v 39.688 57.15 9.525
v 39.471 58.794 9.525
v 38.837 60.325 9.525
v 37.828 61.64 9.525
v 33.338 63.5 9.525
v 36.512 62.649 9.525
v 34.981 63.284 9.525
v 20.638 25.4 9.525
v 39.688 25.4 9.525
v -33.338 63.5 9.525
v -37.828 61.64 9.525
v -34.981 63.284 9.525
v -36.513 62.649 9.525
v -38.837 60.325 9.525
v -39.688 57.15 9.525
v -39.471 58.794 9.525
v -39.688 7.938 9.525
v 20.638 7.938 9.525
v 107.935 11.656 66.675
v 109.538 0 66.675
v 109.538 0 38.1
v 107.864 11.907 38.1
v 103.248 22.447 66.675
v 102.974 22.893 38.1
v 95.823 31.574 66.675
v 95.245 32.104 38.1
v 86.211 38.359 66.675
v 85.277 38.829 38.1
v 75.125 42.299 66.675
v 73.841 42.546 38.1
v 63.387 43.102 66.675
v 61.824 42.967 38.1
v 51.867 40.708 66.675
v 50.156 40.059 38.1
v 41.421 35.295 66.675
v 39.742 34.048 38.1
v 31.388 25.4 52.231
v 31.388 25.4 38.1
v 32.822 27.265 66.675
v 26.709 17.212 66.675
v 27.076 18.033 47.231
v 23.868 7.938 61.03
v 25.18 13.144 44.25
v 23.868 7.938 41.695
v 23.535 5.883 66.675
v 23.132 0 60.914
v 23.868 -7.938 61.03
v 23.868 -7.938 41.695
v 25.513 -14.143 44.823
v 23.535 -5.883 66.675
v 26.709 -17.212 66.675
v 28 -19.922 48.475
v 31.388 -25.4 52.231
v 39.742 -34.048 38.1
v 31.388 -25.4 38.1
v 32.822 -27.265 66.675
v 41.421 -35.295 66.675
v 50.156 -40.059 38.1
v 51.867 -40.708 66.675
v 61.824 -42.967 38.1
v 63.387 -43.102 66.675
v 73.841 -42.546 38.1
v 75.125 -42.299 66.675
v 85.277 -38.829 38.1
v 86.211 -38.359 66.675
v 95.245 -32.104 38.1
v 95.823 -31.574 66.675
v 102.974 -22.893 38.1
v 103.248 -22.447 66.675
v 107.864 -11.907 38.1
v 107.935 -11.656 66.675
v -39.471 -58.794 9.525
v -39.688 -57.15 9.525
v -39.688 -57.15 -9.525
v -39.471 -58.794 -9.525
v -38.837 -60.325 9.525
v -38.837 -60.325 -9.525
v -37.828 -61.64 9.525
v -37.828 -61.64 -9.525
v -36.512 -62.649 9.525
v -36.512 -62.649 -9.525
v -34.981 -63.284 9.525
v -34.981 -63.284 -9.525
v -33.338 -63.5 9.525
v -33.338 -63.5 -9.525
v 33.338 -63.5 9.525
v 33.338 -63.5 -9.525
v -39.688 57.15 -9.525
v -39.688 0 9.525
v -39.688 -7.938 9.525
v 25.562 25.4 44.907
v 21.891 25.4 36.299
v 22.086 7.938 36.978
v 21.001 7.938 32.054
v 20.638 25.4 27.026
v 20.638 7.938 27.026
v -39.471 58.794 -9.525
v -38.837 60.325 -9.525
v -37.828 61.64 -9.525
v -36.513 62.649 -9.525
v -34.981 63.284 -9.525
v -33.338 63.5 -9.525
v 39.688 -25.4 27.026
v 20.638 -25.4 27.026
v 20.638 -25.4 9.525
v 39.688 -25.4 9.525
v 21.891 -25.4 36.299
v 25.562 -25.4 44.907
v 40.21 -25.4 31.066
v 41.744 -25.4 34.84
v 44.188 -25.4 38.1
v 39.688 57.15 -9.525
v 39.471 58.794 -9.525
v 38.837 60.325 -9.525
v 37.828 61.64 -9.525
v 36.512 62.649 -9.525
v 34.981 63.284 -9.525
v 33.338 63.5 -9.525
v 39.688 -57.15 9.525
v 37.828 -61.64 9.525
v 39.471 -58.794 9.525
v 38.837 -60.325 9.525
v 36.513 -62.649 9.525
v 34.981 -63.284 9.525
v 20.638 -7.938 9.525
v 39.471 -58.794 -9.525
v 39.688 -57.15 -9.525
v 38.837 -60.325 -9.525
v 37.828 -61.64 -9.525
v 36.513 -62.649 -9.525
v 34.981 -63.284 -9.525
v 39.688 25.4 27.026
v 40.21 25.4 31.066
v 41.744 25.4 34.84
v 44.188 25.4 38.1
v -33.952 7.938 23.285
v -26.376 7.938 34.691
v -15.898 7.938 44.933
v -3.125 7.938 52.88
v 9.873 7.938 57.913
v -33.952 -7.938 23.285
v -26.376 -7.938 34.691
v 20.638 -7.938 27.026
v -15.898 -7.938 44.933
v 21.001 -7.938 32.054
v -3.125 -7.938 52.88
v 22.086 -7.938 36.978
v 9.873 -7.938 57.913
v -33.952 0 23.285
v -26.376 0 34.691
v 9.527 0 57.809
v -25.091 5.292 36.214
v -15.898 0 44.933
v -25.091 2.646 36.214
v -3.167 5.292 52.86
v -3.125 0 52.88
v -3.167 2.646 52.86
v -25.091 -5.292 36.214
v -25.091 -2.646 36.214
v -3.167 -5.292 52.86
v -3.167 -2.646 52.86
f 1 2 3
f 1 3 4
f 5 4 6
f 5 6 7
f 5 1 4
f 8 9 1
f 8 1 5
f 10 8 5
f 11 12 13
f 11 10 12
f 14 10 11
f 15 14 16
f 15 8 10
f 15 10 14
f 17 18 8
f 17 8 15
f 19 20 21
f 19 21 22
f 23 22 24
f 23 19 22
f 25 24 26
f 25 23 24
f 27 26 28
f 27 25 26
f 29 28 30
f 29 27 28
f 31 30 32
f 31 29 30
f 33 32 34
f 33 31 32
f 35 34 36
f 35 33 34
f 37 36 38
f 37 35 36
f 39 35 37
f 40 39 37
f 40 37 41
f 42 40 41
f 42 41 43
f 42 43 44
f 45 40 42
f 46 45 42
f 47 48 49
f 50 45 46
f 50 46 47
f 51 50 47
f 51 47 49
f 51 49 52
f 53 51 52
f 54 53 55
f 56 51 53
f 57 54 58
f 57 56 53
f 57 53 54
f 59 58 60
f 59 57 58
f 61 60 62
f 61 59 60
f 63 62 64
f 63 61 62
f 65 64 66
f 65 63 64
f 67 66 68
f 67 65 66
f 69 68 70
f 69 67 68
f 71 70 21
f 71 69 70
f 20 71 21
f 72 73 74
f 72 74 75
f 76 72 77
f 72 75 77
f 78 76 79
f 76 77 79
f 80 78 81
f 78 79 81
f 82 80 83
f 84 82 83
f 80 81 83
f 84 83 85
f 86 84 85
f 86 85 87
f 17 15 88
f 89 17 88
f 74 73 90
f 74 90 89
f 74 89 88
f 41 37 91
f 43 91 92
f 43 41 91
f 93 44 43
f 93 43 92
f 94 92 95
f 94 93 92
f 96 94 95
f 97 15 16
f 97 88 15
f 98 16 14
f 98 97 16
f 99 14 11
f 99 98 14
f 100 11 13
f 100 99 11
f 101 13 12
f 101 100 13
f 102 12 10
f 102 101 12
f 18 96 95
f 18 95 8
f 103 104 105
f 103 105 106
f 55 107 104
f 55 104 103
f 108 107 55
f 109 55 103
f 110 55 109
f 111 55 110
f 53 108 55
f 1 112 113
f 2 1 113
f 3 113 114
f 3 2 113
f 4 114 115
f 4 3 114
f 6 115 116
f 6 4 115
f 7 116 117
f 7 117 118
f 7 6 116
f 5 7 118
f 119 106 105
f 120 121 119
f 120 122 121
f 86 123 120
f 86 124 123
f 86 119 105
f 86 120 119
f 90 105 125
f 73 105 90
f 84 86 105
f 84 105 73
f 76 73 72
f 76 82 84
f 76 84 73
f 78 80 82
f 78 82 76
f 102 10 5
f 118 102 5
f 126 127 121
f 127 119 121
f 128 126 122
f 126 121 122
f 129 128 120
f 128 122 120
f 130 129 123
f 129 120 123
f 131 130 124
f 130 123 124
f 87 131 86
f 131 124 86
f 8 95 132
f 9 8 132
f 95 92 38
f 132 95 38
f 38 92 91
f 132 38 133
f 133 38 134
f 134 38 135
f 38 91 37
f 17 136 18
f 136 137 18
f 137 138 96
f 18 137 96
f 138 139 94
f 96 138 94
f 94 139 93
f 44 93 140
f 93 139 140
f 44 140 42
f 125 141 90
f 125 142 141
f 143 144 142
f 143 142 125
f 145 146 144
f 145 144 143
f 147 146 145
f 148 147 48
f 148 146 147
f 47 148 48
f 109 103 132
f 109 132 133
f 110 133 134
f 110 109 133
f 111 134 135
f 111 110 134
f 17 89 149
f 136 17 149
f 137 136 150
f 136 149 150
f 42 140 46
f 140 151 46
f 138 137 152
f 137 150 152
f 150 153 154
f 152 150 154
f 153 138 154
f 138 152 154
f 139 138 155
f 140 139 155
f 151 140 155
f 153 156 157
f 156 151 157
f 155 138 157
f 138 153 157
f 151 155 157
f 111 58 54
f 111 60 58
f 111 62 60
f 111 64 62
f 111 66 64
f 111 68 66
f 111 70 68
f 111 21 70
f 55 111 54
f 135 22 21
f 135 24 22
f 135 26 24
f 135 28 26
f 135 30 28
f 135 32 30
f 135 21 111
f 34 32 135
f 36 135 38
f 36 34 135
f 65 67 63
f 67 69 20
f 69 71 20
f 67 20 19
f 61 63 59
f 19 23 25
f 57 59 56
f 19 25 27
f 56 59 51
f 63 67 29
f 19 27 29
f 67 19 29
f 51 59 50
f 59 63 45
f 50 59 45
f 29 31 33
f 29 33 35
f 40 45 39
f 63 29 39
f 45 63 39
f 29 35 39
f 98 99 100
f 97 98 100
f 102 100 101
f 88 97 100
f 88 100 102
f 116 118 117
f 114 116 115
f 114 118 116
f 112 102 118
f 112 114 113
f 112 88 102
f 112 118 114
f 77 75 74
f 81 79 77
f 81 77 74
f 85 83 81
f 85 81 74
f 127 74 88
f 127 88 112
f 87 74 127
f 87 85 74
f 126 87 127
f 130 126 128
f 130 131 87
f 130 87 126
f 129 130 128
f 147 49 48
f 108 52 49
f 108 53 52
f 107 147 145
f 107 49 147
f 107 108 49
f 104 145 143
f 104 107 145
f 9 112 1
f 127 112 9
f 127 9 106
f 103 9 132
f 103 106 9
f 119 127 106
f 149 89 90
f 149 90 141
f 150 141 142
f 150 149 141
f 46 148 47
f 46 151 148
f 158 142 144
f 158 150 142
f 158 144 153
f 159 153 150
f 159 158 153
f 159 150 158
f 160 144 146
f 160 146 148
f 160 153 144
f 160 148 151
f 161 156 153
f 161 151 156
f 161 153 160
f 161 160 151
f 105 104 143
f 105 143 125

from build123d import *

# Parameters (mm, degrees)
F1_DEPTH = 63.5
F2_DEPTH = 25.4
F3_DEPTH = 7.9375
F0_W     = 43.2026712656
F0_H     = 28.575
F5_R     = 6.35


with BuildPart() as f1:
    # F0 (on Front) → F1 (new body, symmetric)
    with BuildSketch(Plane.XZ):
        Polygon((39.6875, -9.525), (39.6875, 9.525), (20.6375, 9.525), (-39.6875, 9.525), (-39.6875, -9.525), align=None)
    extrude(amount=F1_DEPTH, both=True)

    # F0 (on Front) → F2 (join, symmetric)
    with BuildSketch(Plane.XZ):
        with BuildLine():
            Line((20.6375, 9.525), (39.6875, 9.525))
            Line((39.6875, 9.525), (39.6875, 27.0256))
            ThreePointArc((39.6875, 27.0256), (44.3371798487, 38.2509201513), (55.5625, 42.9006))
            Line((55.5625, 42.9006), (58.7375, 42.9006))
            Line((58.7375, 42.9006), (58.7375, 61.9506))
            Line((58.7375, 61.9506), (55.5625, 61.9506))
            ThreePointArc((55.5625, 61.9506), (30.8667956671, 51.7213043329), (20.6375, 27.0256))
            Line((20.6375, 27.0256), (20.6375, 9.525))
        make_face()
        Polygon((58.7375, 66.675), (58.7375, 61.9506), (58.7375, 42.9006), (58.7375, 38.1), (66.3348287344, 38.1), (66.3348287344, 66.675), align=None)
    extrude(amount=F2_DEPTH, both=True)

    # F0 (on Front) → F3 (join, symmetric)
    with BuildSketch(Plane.XZ):
        with BuildLine():
            Line((-39.6875, 9.525), (20.6375, 9.525))
            Line((20.6375, 9.525), (20.6375, 27.0256))
            ThreePointArc((20.6375, 27.0256), (30.8667956671, 51.7213043329), (55.5625, 61.9506))
            Line((55.5625, 61.9506), (58.7375, 61.9506))
            add(Edge.make_bspline(
                [(-39.6875, 9.525), (-25.5478955805, 54.2332231998), (16.1354914308, 65.4384344816), (58.7375, 61.9506)],
                knots=[0, 0, 0, 0, 111.5164748383, 111.5164748383, 111.5164748383, 111.5164748383], degree=3))
        make_face()
    extrude(amount=F3_DEPTH, both=True)

    # F0 (on Front) → F4 (revolve)
    with BuildSketch(Plane.XZ):
        with Locations((87.9361643672, 52.3875)):
            Rectangle(F0_W, F0_H)
    revolve(axis=Axis((66.3348287344, 0, 52.3875), (0, 0, 1)))

    # F5
    f5_edges = [f1.edges().sort_by_distance(p)[0] for p in [
        (39.6875, -63.5, 0),
        (-39.6875, -63.5, 0),
        (39.6875, 63.5, 0),
        (-39.6875, 63.5, 0),
    ]]
    fillet(f5_edges, radius=F5_R)


solid = f1.part
